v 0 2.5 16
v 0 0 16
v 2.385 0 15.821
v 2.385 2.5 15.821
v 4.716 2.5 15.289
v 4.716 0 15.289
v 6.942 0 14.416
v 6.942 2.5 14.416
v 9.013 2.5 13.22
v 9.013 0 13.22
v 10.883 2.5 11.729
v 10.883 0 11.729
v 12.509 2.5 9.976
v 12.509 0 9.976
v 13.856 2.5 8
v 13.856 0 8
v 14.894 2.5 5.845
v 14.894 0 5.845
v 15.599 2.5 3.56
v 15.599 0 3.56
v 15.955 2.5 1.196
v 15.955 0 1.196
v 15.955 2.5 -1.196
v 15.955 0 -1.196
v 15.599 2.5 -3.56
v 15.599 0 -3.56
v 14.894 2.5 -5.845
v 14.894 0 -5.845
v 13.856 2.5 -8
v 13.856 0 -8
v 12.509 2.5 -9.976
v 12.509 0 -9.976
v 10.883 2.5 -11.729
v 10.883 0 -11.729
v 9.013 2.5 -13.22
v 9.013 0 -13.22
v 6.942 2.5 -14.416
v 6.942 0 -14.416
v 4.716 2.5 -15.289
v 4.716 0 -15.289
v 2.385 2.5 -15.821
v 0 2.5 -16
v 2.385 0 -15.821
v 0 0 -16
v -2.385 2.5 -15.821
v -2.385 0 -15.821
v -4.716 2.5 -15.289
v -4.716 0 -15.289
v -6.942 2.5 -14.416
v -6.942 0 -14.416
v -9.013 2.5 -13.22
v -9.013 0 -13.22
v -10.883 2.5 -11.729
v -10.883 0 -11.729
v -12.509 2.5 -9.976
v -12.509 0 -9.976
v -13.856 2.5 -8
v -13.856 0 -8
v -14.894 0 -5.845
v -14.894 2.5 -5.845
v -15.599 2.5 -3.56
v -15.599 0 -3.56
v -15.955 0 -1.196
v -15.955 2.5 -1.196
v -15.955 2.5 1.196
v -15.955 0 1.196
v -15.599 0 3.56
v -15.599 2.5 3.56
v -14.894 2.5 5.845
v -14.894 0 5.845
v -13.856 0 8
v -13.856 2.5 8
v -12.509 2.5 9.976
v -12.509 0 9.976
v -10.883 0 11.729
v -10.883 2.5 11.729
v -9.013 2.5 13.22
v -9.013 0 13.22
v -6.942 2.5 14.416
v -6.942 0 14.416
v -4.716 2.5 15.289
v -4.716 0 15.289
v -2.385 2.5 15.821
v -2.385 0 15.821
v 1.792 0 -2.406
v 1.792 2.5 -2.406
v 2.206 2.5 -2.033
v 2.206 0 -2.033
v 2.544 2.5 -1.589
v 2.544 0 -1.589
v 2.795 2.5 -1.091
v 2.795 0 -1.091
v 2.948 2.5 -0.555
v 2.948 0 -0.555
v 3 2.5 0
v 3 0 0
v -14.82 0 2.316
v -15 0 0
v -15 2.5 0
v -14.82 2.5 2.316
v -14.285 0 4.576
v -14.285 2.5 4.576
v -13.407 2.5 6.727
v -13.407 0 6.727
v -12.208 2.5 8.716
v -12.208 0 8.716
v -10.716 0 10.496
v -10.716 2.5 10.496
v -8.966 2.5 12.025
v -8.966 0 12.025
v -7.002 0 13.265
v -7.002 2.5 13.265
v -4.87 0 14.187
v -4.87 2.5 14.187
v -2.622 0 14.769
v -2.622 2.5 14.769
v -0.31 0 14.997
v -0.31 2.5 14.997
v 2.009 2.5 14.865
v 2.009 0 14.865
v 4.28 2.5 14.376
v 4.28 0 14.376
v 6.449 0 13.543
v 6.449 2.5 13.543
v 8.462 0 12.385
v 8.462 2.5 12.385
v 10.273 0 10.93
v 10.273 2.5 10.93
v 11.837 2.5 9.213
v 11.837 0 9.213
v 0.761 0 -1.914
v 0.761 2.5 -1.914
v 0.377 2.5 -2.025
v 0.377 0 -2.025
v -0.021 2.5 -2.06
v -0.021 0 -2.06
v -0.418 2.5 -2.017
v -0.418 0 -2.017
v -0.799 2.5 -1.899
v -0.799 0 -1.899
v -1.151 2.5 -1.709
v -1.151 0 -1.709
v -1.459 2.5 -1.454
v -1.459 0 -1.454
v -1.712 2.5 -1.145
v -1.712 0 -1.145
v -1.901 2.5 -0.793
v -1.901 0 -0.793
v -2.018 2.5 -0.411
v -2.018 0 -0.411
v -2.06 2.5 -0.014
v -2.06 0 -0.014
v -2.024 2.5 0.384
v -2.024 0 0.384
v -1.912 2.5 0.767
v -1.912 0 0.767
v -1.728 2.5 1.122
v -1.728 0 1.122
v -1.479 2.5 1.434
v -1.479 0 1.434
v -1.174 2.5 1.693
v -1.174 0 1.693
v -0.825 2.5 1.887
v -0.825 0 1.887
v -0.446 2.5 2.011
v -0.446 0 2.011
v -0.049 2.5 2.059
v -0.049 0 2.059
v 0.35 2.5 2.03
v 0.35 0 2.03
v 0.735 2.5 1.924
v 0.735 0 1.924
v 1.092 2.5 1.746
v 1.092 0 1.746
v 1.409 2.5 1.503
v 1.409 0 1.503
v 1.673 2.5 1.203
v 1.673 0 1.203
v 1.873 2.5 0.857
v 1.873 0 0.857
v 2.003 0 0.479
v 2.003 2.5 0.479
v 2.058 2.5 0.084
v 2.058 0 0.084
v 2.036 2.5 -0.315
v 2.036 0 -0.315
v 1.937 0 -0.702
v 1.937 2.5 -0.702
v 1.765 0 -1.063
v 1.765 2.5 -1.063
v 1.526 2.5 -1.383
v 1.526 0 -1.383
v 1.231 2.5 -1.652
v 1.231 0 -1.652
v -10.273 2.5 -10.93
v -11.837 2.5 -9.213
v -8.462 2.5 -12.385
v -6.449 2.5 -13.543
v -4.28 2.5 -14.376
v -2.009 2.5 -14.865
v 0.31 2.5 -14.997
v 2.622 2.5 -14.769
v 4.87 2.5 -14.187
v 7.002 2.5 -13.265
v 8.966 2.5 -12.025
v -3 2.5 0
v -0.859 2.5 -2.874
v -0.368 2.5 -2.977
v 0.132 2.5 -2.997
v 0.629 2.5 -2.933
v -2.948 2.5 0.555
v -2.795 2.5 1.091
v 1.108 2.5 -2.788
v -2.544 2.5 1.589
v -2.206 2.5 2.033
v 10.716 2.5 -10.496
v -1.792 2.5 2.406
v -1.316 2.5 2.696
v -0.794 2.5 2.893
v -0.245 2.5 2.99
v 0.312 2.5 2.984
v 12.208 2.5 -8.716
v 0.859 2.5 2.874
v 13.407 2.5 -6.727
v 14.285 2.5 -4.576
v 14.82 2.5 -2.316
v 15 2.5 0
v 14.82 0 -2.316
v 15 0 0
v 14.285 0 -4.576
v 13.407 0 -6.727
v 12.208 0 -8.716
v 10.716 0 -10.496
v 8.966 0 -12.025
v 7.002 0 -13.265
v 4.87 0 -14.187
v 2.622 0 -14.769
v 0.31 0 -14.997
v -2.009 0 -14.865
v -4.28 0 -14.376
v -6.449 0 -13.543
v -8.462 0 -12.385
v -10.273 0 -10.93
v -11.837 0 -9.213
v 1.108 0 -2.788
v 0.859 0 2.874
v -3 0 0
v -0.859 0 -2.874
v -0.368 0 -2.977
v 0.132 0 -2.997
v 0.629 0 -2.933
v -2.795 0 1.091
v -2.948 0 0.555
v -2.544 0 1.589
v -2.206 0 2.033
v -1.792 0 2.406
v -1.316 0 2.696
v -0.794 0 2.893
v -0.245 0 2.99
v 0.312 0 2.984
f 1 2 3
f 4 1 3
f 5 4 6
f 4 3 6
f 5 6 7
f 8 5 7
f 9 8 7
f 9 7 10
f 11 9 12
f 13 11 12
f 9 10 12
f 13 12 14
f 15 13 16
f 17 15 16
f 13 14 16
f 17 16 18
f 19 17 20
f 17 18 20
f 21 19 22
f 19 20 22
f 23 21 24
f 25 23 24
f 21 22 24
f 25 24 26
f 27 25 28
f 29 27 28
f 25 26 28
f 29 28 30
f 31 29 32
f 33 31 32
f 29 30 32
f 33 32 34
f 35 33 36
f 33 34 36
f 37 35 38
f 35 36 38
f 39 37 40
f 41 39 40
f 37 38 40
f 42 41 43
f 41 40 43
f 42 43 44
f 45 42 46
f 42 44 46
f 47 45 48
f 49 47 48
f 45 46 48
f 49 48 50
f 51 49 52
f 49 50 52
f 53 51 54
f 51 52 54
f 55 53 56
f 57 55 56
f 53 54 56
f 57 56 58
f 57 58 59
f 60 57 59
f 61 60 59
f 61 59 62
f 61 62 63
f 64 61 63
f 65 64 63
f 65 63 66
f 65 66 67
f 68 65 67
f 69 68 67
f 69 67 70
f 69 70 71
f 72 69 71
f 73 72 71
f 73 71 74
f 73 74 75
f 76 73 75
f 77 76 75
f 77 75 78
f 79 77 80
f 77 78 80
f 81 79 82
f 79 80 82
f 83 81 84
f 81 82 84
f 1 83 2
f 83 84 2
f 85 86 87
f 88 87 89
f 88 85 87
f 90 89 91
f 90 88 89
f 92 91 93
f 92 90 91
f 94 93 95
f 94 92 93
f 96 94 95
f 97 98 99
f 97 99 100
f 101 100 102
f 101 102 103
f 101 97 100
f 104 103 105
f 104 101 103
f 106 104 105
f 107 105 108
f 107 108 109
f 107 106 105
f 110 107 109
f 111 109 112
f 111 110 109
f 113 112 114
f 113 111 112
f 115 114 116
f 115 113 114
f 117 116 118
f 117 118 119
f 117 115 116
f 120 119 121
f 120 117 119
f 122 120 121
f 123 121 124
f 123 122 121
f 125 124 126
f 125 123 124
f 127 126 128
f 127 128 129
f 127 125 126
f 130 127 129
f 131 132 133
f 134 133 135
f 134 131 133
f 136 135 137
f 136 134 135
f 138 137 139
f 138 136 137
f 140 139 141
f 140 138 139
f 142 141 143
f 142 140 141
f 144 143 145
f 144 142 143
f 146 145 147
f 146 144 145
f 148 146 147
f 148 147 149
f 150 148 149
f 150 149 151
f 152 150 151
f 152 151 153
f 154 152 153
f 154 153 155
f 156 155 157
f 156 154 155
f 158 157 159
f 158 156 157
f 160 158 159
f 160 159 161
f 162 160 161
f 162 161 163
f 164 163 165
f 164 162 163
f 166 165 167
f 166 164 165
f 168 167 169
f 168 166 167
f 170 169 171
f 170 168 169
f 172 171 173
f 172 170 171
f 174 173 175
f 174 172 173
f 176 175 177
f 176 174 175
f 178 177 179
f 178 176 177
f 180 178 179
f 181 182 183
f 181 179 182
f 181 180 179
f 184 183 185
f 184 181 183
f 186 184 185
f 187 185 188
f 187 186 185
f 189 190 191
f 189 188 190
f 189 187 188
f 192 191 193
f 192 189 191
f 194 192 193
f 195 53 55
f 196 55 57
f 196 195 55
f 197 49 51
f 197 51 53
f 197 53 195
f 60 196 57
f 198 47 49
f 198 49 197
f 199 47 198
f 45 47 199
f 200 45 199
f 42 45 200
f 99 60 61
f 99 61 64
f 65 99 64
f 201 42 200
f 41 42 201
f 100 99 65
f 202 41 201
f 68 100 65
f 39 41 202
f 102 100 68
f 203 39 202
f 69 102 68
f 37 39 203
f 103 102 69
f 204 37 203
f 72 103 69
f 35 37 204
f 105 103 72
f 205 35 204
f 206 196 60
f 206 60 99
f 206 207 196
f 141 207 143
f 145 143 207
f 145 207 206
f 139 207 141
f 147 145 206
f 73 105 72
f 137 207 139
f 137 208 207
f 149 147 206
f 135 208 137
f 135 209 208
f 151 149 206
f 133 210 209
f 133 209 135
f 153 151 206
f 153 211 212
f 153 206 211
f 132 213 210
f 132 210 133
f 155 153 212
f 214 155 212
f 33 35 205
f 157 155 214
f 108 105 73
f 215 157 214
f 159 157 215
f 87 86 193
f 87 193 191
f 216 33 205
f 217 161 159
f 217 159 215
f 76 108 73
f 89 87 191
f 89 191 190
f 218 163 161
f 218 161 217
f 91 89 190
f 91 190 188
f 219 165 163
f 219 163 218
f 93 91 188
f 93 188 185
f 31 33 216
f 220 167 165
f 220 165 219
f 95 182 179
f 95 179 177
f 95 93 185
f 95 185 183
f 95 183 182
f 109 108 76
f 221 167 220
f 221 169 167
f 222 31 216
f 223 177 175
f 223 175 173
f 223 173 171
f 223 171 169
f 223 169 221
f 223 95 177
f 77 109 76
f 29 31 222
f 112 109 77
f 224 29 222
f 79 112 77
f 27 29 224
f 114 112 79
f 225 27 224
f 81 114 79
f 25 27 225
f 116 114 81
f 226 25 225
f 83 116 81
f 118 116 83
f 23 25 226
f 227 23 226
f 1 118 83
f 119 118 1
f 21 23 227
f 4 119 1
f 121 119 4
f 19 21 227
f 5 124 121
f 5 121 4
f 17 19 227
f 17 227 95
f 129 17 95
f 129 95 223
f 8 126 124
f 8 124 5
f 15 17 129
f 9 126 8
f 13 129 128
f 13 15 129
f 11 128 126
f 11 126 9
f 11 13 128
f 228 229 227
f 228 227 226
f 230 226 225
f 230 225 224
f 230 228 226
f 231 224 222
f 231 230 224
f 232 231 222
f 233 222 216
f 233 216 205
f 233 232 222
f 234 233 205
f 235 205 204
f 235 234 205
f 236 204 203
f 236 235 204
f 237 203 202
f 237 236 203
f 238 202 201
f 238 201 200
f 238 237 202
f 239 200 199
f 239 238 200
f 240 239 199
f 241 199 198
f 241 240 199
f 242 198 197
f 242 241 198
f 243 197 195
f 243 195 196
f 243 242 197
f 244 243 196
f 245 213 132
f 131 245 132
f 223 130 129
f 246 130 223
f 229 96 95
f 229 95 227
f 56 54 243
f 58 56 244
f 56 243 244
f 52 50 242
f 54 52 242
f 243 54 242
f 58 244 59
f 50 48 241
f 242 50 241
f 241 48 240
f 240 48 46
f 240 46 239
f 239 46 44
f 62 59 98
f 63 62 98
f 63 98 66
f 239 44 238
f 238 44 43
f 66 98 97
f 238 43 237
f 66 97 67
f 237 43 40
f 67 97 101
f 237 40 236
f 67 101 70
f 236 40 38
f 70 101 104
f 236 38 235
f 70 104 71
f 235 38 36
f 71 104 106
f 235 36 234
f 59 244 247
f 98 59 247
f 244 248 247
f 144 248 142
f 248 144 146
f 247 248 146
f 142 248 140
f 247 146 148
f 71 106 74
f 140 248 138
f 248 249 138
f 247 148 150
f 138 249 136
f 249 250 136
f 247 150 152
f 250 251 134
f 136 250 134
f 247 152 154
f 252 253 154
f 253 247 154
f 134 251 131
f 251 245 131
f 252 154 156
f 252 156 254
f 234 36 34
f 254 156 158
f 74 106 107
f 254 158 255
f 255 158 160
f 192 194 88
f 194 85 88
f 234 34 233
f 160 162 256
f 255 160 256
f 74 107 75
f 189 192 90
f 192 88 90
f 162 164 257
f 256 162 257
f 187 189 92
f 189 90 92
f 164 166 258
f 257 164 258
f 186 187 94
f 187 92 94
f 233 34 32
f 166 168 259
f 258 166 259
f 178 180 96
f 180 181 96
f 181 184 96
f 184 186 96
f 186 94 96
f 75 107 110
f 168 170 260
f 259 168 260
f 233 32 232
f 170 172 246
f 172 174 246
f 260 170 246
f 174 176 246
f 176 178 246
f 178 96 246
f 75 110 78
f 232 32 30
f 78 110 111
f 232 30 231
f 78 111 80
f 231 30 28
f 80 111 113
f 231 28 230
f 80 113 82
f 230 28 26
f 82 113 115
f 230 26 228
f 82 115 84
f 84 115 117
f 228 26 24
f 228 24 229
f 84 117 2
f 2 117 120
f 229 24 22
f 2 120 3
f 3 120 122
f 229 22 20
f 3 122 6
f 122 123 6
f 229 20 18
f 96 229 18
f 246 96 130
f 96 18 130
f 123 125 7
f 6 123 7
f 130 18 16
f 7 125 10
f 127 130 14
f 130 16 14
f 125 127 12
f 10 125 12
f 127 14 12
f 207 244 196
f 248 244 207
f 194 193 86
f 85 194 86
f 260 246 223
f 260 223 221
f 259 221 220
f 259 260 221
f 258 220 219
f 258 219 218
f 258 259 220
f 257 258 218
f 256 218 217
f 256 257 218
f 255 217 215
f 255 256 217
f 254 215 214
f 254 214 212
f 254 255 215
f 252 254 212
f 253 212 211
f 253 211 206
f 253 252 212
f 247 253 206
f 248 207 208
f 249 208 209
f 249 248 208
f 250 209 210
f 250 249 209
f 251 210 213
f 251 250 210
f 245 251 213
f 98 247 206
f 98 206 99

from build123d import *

# Parameters (mm, degrees)
SKETCH1_R           = 16
SKETCH1_R_2         = 2.06
BOSS_EXTRUDE1_DEPTH = 2.5
CUT_EXTRUDE1_DEPTH  = 23.765104876


with BuildPart() as part:
    # Sketch1 → Boss-Extrude1 (new body)
    with BuildSketch(Plane(origin=(0, 0, 0), x_dir=(1, 0, 0), z_dir=(0, 1, 0))):
        with Locations(Location((0, 0, 0), (0, 0, 270))):
            Circle(SKETCH1_R)
        with Locations(Location((0, 0, 0), (0, 0, 270))):
            Circle(SKETCH1_R_2, mode=Mode.SUBTRACT)
        with BuildLine():
            Line((-3, 0), (-15, 0))
            ThreePointArc((-15, 0), (-4.8703472, -14.187308348), (11.837295753, -9.212948999))
            Line((11.837295753, -9.212948999), (0.858729732, -2.874470951))
            ThreePointArc((0.858729732, -2.874470951), (-1.792178954, -2.405845921), (-3, 0))
        make_face(mode=Mode.SUBTRACT)
        with BuildLine():
            Line((-11.837295753, 9.212948999), (-0.858729732, 2.874470951))
            ThreePointArc((-0.858729732, 2.874470951), (1.792178954, 2.405845921), (3, 0))
            Line((3, 0), (15, 0))
            ThreePointArc((15, 0), (4.8703472, 14.187308348), (-11.837295753, 9.212948999))
        make_face(mode=Mode.SUBTRACT)
    extrude(amount=BOSS_EXTRUDE1_DEPTH)

    # Sketch2 → Cut-Extrude1 (cut, through all)
    with BuildSketch(Plane(origin=(0, 2.5, 0), x_dir=(1, 0, 0), z_dir=(0, 1, 0))):
        with BuildLine():
            Line((1.108433193, 2.787718755), (0.761124126, 1.914233545))
            ThreePointArc((0.761124126, 1.914233545), (1.004470219, 1.798510378), (1.230629548, 1.652014199))
            Line((1.230629548, 1.652014199), (1.792178954, 2.405845921))
            ThreePointArc((1.792178954, 2.405845921), (1.462820707, 2.619189871), (1.108433193, 2.787718755))
        make_face()
    extrude(amount=-CUT_EXTRUDE1_DEPTH, mode=Mode.SUBTRACT)


solid = part.part
